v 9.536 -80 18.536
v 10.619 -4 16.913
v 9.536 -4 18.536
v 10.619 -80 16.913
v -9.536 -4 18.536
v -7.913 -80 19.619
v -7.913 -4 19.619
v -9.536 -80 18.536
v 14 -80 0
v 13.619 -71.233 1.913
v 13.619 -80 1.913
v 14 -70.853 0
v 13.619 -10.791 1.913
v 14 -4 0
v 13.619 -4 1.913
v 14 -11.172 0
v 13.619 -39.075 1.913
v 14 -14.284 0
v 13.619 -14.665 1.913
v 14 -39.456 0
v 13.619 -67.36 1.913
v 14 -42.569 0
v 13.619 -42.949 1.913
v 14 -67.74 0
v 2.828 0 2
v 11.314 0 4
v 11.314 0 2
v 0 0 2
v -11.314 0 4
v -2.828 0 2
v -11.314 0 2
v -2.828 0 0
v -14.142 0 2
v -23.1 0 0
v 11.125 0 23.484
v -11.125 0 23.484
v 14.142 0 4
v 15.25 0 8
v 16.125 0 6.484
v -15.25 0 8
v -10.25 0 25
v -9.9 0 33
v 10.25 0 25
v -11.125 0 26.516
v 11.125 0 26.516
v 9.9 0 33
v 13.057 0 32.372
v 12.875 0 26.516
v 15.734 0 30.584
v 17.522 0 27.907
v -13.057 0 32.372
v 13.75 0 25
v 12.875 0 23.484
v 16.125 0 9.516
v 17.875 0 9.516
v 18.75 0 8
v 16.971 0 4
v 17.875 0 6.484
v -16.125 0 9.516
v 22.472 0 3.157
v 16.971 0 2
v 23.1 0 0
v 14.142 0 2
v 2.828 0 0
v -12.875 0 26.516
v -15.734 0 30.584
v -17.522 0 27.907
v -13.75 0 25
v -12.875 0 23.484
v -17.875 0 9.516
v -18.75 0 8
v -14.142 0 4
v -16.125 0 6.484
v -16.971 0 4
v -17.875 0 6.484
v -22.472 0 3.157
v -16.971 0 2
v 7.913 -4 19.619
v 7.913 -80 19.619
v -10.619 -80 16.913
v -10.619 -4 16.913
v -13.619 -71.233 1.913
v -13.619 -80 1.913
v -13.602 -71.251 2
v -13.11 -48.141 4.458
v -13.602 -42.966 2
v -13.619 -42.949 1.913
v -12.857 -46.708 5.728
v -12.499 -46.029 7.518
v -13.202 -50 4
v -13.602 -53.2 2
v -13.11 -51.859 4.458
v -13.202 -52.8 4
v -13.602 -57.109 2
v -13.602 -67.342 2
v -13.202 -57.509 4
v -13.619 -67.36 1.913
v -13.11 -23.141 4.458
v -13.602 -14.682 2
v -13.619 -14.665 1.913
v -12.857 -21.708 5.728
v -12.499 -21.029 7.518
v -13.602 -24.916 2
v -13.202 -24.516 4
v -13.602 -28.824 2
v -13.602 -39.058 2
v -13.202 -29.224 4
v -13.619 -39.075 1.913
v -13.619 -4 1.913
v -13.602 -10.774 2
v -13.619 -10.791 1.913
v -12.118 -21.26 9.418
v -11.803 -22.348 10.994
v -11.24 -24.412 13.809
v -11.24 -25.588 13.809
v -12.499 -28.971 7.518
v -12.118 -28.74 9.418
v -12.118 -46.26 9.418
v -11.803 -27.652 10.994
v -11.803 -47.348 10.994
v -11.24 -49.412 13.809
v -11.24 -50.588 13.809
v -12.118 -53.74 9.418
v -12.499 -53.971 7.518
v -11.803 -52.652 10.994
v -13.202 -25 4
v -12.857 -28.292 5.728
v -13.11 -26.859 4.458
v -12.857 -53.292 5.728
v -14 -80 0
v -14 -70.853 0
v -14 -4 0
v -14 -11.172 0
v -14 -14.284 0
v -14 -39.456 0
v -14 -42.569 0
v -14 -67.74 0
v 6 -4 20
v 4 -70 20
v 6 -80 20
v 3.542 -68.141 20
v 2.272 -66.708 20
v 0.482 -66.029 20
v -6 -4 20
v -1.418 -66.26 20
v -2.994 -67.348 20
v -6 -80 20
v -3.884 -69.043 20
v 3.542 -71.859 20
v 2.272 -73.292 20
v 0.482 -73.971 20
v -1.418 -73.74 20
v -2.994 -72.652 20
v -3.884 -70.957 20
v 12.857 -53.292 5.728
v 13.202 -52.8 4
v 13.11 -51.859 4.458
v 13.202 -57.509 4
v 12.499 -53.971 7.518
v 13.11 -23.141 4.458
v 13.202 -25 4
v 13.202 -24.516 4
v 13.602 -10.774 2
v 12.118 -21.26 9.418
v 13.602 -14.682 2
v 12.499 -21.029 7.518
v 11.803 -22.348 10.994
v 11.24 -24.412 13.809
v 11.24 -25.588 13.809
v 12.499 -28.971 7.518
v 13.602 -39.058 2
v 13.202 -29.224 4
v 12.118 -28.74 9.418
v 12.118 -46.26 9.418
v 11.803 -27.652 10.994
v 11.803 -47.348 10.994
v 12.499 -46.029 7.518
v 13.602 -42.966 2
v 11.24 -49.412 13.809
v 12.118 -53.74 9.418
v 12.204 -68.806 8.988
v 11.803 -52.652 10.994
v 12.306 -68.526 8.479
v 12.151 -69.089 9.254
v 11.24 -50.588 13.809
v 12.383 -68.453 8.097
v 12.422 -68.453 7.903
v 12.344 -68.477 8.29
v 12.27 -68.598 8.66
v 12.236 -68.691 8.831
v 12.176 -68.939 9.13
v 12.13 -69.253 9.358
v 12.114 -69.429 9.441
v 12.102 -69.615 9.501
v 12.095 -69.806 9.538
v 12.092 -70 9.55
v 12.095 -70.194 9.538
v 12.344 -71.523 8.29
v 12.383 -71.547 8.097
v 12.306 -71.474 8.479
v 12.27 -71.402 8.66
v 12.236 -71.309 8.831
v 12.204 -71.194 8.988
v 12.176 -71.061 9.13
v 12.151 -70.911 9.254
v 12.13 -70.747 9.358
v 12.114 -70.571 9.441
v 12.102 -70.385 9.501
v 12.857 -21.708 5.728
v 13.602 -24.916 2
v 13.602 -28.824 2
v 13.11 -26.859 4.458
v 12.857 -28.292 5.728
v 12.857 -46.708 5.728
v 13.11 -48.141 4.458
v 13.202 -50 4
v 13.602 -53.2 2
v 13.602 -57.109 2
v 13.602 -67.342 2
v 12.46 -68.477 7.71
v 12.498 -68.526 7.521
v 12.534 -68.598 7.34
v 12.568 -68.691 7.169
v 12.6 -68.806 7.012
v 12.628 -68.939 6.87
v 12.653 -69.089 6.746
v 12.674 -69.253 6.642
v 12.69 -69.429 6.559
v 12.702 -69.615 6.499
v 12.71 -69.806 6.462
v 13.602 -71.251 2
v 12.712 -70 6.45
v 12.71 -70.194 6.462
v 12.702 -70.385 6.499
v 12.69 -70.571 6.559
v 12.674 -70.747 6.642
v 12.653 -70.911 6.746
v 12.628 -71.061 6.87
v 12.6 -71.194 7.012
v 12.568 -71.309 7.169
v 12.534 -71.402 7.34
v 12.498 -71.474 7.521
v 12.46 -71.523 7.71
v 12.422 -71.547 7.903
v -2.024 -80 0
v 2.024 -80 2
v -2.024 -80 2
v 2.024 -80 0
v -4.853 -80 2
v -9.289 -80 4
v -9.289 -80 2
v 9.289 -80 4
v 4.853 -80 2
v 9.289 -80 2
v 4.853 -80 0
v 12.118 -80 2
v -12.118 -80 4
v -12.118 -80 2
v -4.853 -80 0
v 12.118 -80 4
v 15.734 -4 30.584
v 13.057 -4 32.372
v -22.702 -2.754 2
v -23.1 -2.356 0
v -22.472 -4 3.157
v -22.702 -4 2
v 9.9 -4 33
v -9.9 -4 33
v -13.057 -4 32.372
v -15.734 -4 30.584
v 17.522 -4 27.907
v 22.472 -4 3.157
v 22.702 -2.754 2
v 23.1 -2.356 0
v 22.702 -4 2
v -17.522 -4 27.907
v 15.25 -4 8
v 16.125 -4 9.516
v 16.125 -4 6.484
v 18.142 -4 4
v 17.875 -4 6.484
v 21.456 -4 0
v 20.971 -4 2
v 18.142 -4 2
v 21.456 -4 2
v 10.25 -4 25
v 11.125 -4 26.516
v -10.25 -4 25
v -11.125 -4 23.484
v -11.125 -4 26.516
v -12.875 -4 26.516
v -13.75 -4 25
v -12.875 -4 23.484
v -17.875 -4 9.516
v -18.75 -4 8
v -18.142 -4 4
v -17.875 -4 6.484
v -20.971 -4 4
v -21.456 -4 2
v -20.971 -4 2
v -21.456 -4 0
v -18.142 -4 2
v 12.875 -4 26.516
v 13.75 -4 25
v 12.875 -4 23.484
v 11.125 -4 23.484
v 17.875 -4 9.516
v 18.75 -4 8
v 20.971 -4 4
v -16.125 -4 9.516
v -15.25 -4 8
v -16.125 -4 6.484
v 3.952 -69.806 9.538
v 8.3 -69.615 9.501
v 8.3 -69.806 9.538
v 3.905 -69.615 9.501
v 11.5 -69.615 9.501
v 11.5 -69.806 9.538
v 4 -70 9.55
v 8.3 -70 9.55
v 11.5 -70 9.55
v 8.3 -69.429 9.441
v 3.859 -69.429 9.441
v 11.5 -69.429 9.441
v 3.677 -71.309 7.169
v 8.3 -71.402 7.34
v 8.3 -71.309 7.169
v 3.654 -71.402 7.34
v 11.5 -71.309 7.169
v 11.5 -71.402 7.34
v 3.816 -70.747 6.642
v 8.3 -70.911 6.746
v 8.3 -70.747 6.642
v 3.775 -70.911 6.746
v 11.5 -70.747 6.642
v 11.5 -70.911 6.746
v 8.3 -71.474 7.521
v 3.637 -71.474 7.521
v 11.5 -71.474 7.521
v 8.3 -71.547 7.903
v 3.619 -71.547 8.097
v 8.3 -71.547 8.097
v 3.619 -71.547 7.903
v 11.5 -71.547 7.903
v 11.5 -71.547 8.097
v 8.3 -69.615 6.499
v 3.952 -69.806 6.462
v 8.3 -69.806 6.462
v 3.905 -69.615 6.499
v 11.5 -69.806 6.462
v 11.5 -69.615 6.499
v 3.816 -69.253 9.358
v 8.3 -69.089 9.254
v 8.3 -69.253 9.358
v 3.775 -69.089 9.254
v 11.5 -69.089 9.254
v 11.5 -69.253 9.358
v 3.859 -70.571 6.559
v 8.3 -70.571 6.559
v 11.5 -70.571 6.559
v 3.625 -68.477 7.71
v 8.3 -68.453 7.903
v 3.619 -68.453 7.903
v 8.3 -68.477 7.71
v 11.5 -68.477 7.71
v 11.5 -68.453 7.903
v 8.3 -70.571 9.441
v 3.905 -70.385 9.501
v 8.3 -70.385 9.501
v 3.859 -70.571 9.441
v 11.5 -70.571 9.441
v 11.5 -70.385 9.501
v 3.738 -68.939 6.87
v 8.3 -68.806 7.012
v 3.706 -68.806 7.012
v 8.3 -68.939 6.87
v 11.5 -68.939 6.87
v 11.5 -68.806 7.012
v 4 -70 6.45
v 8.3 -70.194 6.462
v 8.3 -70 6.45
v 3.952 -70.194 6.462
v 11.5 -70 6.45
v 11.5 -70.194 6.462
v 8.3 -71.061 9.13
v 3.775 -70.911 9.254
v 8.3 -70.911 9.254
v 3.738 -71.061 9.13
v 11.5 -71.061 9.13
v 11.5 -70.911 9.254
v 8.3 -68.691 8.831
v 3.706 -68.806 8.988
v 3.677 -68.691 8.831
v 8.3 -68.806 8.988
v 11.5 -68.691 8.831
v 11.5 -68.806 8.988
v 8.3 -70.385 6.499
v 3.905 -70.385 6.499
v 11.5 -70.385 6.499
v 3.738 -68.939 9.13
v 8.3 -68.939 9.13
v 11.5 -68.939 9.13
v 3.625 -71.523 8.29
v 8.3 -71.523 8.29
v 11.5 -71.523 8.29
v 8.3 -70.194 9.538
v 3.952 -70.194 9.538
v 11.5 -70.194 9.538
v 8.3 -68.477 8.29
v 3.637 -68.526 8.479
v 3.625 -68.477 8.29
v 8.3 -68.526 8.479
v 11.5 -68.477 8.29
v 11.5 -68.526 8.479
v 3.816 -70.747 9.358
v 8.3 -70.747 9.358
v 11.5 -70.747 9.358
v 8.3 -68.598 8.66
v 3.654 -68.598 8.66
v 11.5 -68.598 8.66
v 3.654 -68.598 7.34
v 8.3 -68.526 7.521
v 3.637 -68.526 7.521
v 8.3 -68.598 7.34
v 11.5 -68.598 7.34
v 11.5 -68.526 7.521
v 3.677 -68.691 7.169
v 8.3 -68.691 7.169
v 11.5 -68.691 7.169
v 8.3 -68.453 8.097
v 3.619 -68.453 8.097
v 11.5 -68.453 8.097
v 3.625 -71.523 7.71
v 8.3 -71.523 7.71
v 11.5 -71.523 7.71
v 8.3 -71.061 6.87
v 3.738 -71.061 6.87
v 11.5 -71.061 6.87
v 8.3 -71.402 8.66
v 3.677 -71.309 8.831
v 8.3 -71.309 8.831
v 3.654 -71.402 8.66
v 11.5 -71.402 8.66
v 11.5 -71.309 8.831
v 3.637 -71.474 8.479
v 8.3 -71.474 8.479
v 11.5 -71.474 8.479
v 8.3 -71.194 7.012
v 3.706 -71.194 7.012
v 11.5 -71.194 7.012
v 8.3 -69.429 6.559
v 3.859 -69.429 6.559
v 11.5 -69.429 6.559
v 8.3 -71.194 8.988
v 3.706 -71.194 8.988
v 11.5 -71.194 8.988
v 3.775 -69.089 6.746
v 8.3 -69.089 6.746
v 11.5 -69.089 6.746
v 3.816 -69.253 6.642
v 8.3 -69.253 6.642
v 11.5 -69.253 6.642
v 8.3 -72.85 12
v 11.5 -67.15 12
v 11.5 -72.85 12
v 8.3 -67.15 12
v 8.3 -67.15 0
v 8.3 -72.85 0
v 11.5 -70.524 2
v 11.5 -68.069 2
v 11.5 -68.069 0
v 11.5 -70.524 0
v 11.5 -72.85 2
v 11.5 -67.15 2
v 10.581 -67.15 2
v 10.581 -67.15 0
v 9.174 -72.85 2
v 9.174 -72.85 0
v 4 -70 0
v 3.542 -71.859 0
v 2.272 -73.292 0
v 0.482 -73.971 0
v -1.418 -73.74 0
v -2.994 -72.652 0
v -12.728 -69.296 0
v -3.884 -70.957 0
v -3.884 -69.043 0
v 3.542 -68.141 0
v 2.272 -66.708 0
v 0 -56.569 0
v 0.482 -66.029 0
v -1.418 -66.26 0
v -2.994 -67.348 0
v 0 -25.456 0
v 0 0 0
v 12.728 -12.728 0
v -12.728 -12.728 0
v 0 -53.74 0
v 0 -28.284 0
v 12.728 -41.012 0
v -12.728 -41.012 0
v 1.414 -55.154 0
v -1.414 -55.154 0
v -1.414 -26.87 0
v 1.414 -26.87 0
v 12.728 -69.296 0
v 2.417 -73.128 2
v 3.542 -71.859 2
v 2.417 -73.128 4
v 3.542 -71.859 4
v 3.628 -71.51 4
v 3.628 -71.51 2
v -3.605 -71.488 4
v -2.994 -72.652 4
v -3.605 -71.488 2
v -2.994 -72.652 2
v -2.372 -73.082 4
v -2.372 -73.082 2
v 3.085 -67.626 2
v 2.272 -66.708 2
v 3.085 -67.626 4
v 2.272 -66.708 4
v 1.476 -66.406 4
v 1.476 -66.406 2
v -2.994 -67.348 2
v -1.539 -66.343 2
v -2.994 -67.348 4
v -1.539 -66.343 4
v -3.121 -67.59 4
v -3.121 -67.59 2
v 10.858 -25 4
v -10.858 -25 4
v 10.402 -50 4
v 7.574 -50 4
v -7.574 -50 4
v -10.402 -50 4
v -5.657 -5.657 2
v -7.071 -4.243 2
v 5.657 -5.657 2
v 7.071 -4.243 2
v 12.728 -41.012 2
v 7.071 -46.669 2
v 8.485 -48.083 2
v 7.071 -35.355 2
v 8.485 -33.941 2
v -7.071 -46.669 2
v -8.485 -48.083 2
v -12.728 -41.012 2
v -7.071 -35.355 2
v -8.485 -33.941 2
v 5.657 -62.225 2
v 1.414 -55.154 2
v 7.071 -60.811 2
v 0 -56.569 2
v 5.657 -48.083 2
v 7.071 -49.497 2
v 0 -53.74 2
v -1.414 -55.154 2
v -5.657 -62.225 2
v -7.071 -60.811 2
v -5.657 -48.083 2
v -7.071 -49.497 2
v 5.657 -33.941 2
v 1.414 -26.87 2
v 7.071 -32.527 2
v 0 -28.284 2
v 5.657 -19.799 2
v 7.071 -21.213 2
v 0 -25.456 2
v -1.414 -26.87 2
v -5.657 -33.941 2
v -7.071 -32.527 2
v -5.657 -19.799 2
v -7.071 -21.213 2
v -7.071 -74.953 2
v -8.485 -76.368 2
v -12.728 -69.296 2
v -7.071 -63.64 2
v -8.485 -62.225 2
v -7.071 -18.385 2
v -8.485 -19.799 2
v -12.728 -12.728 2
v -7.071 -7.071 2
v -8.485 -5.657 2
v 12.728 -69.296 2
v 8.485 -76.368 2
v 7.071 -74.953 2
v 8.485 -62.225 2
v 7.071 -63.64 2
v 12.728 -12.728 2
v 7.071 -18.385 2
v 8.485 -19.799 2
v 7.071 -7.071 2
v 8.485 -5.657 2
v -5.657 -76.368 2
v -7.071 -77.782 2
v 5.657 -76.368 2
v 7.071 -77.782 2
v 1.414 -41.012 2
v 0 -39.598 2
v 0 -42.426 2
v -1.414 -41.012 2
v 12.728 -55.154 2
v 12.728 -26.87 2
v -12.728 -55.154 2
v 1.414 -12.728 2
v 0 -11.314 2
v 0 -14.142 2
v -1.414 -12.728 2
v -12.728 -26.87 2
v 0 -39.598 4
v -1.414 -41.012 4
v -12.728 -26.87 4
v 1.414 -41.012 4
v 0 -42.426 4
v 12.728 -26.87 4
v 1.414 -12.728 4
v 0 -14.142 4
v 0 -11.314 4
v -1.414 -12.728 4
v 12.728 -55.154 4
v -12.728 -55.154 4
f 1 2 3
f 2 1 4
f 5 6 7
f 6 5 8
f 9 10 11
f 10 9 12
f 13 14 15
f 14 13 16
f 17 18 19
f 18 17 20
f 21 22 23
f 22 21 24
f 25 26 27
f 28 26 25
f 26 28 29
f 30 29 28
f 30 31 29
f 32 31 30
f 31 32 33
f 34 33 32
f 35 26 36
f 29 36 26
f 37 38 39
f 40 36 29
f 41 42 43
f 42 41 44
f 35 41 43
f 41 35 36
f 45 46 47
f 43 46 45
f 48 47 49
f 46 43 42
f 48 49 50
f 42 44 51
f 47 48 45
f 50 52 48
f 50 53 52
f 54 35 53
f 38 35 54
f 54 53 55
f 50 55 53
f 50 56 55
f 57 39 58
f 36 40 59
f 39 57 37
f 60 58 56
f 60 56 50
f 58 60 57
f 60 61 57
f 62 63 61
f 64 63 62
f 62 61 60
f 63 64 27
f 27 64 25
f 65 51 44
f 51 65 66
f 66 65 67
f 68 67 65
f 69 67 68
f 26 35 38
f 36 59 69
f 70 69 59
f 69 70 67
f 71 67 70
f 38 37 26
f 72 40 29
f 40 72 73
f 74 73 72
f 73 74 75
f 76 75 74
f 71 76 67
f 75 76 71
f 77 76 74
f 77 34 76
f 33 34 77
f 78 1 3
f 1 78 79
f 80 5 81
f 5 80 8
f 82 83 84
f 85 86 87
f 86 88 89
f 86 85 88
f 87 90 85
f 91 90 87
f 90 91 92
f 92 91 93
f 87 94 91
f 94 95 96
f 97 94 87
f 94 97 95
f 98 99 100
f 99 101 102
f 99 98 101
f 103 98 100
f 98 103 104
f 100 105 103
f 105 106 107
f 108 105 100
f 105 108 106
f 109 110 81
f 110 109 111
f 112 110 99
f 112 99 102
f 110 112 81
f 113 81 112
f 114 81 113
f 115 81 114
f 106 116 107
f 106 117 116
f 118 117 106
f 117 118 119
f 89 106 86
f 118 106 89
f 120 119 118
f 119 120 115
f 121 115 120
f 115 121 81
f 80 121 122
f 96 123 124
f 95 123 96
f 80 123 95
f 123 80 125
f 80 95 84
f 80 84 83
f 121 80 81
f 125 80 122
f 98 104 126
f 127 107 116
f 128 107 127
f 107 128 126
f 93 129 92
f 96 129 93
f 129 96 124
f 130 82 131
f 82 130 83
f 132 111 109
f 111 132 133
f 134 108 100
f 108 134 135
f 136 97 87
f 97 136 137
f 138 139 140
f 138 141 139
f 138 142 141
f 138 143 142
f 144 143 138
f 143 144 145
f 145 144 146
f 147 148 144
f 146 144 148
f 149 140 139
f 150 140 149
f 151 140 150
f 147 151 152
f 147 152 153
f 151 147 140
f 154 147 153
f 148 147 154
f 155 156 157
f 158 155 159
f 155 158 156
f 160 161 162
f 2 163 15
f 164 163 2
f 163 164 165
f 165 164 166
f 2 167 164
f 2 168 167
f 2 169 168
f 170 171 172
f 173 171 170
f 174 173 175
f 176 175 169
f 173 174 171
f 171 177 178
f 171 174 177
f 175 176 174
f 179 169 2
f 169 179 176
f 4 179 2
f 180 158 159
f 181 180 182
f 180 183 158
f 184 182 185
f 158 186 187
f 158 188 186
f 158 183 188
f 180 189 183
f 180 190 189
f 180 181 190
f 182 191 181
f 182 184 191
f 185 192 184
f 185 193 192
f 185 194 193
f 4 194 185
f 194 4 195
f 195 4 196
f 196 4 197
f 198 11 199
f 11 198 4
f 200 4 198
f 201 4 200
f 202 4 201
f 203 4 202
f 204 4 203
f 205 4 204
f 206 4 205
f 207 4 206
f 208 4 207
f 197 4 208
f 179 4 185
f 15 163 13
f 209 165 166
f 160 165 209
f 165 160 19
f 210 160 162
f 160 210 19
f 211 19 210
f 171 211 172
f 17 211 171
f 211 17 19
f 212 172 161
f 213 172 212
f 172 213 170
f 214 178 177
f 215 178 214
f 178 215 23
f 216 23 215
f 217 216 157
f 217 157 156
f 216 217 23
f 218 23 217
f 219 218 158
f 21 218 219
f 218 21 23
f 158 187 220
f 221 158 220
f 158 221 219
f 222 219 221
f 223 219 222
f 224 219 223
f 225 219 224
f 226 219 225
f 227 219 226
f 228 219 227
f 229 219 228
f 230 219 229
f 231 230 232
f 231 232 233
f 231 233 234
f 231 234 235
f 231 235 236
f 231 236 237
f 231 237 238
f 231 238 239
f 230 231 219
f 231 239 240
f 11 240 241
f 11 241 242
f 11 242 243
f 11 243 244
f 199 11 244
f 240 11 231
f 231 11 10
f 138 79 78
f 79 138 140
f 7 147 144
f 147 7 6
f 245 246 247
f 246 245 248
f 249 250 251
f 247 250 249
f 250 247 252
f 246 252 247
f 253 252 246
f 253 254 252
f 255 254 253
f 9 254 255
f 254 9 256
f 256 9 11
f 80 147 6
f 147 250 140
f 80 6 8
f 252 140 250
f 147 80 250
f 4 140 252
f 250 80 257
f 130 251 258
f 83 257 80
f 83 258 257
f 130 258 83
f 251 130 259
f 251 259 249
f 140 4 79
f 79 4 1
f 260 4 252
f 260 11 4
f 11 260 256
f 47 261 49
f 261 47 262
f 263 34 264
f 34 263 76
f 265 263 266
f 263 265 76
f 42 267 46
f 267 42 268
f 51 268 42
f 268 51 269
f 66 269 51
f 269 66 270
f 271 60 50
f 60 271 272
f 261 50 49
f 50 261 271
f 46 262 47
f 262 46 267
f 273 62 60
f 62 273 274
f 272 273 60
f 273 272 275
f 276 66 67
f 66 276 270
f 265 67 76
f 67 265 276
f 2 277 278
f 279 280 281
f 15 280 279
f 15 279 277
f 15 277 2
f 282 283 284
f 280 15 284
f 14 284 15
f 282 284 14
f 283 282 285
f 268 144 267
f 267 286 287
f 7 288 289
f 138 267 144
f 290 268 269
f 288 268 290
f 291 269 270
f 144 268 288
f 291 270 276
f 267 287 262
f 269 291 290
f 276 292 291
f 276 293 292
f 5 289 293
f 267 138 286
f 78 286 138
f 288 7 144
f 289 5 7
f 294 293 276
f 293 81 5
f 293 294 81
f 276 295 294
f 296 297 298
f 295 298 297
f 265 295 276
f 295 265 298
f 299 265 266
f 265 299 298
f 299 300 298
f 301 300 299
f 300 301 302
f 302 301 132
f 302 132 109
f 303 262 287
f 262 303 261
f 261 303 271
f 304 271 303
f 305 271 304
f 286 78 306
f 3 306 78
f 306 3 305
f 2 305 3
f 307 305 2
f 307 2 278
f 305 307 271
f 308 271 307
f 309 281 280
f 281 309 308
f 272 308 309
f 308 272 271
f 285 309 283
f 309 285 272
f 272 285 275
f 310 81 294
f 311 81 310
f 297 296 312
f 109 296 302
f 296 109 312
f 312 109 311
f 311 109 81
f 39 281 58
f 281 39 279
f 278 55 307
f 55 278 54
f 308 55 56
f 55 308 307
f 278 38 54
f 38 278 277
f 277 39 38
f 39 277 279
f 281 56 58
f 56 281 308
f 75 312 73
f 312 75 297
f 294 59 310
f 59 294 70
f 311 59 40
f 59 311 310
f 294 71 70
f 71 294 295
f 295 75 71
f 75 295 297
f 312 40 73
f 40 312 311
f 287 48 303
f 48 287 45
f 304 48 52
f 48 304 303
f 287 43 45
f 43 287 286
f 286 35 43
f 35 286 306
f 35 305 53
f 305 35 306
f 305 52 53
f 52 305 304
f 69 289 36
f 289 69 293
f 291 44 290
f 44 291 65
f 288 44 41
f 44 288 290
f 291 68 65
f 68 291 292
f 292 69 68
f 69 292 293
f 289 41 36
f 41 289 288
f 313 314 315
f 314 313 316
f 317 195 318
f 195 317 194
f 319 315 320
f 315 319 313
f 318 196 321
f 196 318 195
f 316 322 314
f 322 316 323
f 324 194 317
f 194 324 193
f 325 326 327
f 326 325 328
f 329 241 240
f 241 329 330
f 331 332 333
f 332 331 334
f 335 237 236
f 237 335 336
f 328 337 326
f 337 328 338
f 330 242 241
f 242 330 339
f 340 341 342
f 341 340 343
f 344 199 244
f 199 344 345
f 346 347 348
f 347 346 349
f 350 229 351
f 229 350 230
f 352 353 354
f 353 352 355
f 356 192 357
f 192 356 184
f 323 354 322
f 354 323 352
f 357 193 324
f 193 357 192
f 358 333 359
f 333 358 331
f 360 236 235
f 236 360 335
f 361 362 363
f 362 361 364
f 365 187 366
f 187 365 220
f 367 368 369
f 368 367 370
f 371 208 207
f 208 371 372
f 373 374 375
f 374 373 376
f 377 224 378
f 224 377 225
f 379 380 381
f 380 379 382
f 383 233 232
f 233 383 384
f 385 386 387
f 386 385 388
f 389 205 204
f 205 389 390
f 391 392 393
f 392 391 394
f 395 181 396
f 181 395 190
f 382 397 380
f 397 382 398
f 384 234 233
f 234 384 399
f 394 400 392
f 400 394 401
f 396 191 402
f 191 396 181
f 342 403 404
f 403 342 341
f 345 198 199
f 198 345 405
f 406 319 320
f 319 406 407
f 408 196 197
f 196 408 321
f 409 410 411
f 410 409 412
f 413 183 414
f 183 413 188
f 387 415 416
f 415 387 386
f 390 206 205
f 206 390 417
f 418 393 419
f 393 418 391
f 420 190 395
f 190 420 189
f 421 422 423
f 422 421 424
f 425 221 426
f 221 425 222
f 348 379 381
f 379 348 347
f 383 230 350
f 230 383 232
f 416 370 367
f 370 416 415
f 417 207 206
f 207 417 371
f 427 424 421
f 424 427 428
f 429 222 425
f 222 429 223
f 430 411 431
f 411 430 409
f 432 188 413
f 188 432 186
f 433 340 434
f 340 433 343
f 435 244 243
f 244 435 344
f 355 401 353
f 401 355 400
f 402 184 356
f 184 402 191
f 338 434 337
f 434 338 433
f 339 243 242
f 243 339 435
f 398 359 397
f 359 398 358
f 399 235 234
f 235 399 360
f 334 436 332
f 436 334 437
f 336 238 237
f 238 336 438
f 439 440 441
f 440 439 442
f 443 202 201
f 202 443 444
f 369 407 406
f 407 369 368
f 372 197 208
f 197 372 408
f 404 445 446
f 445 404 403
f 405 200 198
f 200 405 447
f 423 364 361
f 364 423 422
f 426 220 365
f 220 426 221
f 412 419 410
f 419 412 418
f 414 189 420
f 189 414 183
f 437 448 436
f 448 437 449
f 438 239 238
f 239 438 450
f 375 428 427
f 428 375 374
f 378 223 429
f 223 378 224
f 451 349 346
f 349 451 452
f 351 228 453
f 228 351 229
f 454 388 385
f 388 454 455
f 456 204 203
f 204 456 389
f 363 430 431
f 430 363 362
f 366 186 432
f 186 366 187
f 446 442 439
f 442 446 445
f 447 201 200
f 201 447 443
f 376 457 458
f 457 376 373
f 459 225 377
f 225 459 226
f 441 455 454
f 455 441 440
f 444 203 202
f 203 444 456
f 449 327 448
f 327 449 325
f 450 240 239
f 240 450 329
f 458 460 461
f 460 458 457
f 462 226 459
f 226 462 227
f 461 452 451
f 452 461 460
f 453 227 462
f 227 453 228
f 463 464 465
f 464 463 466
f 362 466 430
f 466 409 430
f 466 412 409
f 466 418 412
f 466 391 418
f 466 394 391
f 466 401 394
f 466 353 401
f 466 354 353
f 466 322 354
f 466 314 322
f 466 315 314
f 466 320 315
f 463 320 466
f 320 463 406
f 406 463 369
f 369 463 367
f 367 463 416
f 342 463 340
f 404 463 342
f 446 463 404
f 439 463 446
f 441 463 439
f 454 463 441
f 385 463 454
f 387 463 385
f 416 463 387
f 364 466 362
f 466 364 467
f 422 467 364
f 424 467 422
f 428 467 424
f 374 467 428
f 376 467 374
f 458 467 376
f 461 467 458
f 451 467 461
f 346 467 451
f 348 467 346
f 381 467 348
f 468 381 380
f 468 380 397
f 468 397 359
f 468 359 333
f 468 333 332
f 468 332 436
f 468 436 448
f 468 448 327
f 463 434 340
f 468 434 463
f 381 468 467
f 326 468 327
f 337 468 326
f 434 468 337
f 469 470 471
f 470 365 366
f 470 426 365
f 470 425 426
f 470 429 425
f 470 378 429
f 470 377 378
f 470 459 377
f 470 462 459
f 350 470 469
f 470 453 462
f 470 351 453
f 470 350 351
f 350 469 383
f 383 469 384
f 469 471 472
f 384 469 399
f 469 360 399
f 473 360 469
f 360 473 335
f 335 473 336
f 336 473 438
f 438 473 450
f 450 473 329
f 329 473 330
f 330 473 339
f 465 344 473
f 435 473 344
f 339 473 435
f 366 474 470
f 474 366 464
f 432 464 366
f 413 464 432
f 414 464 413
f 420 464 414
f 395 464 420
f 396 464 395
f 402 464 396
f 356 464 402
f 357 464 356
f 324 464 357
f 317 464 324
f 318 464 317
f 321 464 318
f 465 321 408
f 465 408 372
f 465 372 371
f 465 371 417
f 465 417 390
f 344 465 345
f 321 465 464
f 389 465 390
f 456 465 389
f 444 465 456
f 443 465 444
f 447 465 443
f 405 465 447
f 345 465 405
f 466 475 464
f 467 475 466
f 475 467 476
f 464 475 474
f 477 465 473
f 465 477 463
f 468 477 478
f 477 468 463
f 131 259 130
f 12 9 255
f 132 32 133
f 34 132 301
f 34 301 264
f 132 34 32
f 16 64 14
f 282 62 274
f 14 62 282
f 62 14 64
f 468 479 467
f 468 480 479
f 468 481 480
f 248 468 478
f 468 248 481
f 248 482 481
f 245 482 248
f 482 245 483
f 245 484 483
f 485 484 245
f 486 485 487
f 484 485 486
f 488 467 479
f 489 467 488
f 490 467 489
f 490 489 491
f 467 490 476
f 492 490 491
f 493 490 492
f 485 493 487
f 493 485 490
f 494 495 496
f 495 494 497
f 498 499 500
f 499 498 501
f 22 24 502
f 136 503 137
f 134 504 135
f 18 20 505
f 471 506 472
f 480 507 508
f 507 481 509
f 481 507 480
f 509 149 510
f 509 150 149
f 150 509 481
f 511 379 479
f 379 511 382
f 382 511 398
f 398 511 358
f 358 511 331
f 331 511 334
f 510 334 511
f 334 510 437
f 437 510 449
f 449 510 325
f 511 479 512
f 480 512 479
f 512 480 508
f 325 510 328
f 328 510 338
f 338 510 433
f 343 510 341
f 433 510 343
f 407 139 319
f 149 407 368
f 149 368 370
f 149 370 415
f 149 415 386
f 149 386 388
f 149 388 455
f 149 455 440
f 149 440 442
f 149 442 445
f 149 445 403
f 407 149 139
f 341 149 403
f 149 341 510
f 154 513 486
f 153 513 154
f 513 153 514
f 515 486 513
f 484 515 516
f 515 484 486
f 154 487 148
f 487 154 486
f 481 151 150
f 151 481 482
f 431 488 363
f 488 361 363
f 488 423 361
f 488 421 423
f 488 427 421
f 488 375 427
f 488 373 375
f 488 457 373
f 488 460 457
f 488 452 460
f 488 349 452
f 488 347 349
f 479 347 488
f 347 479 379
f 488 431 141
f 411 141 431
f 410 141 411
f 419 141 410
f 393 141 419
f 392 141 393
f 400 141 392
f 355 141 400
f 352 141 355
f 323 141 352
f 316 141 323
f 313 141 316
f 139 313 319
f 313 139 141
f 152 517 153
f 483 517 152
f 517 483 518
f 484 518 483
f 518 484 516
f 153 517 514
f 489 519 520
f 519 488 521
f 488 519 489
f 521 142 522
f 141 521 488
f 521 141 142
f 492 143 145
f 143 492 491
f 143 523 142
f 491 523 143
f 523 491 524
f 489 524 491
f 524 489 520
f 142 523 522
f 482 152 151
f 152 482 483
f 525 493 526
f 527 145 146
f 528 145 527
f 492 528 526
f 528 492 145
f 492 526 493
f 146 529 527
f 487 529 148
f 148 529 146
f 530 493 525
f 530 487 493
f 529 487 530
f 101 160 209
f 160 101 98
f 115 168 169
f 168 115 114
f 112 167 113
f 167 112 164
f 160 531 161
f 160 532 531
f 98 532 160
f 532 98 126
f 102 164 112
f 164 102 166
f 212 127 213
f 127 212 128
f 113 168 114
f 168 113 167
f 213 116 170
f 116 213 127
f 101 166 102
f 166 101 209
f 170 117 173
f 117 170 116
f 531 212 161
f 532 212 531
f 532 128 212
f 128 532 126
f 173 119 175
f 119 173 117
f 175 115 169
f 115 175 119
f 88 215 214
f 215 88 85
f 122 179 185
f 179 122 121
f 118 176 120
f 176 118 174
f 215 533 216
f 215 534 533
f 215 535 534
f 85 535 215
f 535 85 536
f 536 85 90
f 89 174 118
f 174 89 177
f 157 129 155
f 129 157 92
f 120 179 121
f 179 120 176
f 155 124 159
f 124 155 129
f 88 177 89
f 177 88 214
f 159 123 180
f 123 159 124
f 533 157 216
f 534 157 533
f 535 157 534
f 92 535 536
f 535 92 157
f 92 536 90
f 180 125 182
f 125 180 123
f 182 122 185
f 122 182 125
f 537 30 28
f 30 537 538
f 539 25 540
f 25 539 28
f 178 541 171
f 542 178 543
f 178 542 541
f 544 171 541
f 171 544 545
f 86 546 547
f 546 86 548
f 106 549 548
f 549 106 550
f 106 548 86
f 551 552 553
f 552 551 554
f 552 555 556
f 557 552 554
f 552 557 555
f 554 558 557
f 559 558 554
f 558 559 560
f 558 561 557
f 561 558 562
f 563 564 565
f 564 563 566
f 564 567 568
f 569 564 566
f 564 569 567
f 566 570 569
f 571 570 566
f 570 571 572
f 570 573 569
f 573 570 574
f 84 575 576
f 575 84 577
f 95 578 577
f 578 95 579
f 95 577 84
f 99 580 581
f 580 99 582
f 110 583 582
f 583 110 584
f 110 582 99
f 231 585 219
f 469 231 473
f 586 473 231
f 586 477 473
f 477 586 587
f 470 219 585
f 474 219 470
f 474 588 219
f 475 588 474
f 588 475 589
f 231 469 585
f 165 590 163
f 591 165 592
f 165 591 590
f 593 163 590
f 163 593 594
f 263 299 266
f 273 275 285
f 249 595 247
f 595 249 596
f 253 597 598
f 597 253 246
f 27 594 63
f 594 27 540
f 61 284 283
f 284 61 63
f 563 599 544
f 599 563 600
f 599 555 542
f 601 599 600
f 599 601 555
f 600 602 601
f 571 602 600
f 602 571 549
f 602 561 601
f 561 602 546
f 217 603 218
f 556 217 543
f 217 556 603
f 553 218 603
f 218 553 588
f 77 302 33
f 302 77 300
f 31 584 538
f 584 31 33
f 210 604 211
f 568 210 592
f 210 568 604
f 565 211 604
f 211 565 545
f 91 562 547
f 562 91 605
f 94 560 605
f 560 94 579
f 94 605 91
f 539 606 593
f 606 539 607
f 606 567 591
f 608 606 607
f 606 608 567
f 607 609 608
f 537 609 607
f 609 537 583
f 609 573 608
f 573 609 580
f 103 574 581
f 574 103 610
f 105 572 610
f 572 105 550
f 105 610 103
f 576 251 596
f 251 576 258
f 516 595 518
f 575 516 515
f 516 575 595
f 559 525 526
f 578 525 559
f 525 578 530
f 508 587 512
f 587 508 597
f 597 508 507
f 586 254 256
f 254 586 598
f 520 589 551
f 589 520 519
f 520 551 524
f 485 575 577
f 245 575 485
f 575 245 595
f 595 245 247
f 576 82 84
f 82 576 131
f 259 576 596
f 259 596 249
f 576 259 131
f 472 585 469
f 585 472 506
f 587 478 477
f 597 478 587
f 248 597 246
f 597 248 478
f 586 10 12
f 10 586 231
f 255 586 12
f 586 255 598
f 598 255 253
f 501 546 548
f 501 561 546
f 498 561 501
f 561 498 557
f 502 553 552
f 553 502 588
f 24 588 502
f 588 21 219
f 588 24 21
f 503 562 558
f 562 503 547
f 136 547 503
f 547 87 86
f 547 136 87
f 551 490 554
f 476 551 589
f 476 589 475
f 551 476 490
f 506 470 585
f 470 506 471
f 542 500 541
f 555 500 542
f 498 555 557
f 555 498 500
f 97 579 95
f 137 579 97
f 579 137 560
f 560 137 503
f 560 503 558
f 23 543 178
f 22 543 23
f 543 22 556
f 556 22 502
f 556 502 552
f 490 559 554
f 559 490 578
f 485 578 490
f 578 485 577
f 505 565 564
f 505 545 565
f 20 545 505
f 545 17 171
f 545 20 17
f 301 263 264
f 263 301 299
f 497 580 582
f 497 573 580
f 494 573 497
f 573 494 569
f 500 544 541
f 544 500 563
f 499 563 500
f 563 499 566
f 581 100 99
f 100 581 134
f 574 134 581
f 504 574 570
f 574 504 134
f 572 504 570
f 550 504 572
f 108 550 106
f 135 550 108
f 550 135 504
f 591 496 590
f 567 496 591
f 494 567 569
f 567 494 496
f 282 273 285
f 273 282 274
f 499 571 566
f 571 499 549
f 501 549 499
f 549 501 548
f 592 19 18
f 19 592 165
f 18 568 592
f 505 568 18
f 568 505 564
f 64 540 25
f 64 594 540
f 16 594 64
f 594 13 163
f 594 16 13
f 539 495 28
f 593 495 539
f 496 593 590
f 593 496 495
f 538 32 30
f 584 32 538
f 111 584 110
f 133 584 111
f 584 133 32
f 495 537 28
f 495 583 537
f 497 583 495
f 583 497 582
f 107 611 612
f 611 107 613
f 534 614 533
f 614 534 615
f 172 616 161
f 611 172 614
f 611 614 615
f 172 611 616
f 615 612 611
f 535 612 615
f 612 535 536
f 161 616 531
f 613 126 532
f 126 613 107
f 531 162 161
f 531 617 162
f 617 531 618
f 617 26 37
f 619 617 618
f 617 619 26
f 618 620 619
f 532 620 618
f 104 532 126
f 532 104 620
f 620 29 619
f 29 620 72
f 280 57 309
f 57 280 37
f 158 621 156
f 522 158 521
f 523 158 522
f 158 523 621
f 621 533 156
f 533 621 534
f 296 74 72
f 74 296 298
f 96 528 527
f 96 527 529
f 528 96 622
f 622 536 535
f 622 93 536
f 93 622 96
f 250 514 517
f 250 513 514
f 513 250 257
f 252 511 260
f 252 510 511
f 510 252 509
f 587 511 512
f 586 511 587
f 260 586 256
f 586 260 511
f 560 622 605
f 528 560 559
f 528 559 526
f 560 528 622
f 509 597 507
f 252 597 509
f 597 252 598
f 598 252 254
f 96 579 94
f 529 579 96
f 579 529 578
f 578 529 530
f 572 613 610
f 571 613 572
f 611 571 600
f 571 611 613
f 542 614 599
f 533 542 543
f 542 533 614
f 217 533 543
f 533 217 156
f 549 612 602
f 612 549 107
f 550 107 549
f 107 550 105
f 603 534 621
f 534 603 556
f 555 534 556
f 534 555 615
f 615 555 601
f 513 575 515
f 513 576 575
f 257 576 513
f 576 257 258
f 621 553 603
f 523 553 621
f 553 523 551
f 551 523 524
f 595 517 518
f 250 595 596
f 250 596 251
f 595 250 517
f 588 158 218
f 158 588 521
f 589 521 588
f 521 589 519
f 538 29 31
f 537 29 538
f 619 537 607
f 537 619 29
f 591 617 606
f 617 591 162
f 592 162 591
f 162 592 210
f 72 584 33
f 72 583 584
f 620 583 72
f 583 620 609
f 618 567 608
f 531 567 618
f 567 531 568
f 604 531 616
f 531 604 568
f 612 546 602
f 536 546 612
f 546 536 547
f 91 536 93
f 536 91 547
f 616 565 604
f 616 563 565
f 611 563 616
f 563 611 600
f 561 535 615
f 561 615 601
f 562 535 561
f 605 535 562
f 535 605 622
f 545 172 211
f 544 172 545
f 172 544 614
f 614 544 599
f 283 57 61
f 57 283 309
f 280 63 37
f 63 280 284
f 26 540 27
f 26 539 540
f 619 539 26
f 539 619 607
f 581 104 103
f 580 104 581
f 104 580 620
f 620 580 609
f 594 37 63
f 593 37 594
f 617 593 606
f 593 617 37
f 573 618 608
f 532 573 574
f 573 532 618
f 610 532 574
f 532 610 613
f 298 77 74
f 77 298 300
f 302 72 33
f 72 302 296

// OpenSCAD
// file: common_components.scad
module rod_clamp_holes(){

	bolt_head_radius = 3.5;
	bolt_shaft_radius = 1.55;
	depth = 20; 
	nut_depth = 8.5; 
	nut_radius = 2.0; 

	cylinder(h=depth, r=bolt_shaft_radius, $fn=50);

	cylinder(h=4, r=bolt_head_radius);

	translate([-nut_depth, -5.7/2, nut_depth]) 
		cube([nut_depth + nut_radius +2 , 5.7, 3.2]);

}

//rod_clamp_holes();




module warp_prevention(){

	translate([-100,-100,0]){
		for(i = [0:20:200]){
	
			translate([i, 0, 0])
				cube([2, 200, 2]);
	
			translate([0, i, 0])
				cube([200, 2, 2]);
	
		}
	}

}

module teardrop_cylinder(r, h){

	linear_extrude(height=h){
		hull(){
	
			circle(r=r);
			translate([-r * 1.25, 0])
				circle(r=1);
	
		}
	}
}
// main file
	
include <common_components.scad>

y_rod_height = 70;
rod_radius = 4;
screw_radius = 1.75;


//y_end_2d();

// rotate for printing

difference(){

	rotate([90,0,0]) 
		y_end(); 


	rotate([0,0,45]) 
		warp_prevention();

	translate([sqrt(200),0,2])
		rotate([0,0,45]) 
			warp_prevention();


}

// no rotate for viewing
//y_end(); 

module y_end(){



	difference(){
	
		union(){
			linear_extrude(height=80)
				y_end_2d();

			translate([0, 0, 0]){
				linear_extrude(height=4)
					scale([1.65, 1.65])
						y_end_2d();
			}

		}


		translate([-50, -40, -5])
			#cube([100,40, 90]);
	
	
		//translate([-50, 16, -1])
		//	#cube([150,100, 40]);

		for(x = [17, -17]){ 			
			translate([x, 8, -1])
				#cylinder(r=screw_radius, h=6);
		}

		for(x = [12, -12]){ 			
			translate([x, 25, -1])
				#cylinder(r=screw_radius, h=6);
		}

	
		// y rods
		translate([0, 35, y_rod_height])
			rotate([90,0,0])
				#cylinder(r=rod_radius, h=60);
		
		translate([20, 8, y_rod_height])
			rotate([90,180,270])
				#rod_clamp_holes();

		translate([-30, 8, 25])
			rotate([-90,0,0])
				rotate([0,90,0])
					#teardrop_cylinder(r=rod_radius, h=60);
	
		translate([-30, 8, 50])
			rotate([-90,0,0])
				rotate([0,90,0])
					#teardrop_cylinder(r=rod_radius, h=60);



	}


}

module y_end_2d(){


	hull(){
		
		translate([-9, 0])
			circle(r=5);

		translate([9, 0])
			circle(r=5);

		translate([-6, 15])
			circle(r=5);

		translate([6, 15])
			circle(r=5);


	}

}
